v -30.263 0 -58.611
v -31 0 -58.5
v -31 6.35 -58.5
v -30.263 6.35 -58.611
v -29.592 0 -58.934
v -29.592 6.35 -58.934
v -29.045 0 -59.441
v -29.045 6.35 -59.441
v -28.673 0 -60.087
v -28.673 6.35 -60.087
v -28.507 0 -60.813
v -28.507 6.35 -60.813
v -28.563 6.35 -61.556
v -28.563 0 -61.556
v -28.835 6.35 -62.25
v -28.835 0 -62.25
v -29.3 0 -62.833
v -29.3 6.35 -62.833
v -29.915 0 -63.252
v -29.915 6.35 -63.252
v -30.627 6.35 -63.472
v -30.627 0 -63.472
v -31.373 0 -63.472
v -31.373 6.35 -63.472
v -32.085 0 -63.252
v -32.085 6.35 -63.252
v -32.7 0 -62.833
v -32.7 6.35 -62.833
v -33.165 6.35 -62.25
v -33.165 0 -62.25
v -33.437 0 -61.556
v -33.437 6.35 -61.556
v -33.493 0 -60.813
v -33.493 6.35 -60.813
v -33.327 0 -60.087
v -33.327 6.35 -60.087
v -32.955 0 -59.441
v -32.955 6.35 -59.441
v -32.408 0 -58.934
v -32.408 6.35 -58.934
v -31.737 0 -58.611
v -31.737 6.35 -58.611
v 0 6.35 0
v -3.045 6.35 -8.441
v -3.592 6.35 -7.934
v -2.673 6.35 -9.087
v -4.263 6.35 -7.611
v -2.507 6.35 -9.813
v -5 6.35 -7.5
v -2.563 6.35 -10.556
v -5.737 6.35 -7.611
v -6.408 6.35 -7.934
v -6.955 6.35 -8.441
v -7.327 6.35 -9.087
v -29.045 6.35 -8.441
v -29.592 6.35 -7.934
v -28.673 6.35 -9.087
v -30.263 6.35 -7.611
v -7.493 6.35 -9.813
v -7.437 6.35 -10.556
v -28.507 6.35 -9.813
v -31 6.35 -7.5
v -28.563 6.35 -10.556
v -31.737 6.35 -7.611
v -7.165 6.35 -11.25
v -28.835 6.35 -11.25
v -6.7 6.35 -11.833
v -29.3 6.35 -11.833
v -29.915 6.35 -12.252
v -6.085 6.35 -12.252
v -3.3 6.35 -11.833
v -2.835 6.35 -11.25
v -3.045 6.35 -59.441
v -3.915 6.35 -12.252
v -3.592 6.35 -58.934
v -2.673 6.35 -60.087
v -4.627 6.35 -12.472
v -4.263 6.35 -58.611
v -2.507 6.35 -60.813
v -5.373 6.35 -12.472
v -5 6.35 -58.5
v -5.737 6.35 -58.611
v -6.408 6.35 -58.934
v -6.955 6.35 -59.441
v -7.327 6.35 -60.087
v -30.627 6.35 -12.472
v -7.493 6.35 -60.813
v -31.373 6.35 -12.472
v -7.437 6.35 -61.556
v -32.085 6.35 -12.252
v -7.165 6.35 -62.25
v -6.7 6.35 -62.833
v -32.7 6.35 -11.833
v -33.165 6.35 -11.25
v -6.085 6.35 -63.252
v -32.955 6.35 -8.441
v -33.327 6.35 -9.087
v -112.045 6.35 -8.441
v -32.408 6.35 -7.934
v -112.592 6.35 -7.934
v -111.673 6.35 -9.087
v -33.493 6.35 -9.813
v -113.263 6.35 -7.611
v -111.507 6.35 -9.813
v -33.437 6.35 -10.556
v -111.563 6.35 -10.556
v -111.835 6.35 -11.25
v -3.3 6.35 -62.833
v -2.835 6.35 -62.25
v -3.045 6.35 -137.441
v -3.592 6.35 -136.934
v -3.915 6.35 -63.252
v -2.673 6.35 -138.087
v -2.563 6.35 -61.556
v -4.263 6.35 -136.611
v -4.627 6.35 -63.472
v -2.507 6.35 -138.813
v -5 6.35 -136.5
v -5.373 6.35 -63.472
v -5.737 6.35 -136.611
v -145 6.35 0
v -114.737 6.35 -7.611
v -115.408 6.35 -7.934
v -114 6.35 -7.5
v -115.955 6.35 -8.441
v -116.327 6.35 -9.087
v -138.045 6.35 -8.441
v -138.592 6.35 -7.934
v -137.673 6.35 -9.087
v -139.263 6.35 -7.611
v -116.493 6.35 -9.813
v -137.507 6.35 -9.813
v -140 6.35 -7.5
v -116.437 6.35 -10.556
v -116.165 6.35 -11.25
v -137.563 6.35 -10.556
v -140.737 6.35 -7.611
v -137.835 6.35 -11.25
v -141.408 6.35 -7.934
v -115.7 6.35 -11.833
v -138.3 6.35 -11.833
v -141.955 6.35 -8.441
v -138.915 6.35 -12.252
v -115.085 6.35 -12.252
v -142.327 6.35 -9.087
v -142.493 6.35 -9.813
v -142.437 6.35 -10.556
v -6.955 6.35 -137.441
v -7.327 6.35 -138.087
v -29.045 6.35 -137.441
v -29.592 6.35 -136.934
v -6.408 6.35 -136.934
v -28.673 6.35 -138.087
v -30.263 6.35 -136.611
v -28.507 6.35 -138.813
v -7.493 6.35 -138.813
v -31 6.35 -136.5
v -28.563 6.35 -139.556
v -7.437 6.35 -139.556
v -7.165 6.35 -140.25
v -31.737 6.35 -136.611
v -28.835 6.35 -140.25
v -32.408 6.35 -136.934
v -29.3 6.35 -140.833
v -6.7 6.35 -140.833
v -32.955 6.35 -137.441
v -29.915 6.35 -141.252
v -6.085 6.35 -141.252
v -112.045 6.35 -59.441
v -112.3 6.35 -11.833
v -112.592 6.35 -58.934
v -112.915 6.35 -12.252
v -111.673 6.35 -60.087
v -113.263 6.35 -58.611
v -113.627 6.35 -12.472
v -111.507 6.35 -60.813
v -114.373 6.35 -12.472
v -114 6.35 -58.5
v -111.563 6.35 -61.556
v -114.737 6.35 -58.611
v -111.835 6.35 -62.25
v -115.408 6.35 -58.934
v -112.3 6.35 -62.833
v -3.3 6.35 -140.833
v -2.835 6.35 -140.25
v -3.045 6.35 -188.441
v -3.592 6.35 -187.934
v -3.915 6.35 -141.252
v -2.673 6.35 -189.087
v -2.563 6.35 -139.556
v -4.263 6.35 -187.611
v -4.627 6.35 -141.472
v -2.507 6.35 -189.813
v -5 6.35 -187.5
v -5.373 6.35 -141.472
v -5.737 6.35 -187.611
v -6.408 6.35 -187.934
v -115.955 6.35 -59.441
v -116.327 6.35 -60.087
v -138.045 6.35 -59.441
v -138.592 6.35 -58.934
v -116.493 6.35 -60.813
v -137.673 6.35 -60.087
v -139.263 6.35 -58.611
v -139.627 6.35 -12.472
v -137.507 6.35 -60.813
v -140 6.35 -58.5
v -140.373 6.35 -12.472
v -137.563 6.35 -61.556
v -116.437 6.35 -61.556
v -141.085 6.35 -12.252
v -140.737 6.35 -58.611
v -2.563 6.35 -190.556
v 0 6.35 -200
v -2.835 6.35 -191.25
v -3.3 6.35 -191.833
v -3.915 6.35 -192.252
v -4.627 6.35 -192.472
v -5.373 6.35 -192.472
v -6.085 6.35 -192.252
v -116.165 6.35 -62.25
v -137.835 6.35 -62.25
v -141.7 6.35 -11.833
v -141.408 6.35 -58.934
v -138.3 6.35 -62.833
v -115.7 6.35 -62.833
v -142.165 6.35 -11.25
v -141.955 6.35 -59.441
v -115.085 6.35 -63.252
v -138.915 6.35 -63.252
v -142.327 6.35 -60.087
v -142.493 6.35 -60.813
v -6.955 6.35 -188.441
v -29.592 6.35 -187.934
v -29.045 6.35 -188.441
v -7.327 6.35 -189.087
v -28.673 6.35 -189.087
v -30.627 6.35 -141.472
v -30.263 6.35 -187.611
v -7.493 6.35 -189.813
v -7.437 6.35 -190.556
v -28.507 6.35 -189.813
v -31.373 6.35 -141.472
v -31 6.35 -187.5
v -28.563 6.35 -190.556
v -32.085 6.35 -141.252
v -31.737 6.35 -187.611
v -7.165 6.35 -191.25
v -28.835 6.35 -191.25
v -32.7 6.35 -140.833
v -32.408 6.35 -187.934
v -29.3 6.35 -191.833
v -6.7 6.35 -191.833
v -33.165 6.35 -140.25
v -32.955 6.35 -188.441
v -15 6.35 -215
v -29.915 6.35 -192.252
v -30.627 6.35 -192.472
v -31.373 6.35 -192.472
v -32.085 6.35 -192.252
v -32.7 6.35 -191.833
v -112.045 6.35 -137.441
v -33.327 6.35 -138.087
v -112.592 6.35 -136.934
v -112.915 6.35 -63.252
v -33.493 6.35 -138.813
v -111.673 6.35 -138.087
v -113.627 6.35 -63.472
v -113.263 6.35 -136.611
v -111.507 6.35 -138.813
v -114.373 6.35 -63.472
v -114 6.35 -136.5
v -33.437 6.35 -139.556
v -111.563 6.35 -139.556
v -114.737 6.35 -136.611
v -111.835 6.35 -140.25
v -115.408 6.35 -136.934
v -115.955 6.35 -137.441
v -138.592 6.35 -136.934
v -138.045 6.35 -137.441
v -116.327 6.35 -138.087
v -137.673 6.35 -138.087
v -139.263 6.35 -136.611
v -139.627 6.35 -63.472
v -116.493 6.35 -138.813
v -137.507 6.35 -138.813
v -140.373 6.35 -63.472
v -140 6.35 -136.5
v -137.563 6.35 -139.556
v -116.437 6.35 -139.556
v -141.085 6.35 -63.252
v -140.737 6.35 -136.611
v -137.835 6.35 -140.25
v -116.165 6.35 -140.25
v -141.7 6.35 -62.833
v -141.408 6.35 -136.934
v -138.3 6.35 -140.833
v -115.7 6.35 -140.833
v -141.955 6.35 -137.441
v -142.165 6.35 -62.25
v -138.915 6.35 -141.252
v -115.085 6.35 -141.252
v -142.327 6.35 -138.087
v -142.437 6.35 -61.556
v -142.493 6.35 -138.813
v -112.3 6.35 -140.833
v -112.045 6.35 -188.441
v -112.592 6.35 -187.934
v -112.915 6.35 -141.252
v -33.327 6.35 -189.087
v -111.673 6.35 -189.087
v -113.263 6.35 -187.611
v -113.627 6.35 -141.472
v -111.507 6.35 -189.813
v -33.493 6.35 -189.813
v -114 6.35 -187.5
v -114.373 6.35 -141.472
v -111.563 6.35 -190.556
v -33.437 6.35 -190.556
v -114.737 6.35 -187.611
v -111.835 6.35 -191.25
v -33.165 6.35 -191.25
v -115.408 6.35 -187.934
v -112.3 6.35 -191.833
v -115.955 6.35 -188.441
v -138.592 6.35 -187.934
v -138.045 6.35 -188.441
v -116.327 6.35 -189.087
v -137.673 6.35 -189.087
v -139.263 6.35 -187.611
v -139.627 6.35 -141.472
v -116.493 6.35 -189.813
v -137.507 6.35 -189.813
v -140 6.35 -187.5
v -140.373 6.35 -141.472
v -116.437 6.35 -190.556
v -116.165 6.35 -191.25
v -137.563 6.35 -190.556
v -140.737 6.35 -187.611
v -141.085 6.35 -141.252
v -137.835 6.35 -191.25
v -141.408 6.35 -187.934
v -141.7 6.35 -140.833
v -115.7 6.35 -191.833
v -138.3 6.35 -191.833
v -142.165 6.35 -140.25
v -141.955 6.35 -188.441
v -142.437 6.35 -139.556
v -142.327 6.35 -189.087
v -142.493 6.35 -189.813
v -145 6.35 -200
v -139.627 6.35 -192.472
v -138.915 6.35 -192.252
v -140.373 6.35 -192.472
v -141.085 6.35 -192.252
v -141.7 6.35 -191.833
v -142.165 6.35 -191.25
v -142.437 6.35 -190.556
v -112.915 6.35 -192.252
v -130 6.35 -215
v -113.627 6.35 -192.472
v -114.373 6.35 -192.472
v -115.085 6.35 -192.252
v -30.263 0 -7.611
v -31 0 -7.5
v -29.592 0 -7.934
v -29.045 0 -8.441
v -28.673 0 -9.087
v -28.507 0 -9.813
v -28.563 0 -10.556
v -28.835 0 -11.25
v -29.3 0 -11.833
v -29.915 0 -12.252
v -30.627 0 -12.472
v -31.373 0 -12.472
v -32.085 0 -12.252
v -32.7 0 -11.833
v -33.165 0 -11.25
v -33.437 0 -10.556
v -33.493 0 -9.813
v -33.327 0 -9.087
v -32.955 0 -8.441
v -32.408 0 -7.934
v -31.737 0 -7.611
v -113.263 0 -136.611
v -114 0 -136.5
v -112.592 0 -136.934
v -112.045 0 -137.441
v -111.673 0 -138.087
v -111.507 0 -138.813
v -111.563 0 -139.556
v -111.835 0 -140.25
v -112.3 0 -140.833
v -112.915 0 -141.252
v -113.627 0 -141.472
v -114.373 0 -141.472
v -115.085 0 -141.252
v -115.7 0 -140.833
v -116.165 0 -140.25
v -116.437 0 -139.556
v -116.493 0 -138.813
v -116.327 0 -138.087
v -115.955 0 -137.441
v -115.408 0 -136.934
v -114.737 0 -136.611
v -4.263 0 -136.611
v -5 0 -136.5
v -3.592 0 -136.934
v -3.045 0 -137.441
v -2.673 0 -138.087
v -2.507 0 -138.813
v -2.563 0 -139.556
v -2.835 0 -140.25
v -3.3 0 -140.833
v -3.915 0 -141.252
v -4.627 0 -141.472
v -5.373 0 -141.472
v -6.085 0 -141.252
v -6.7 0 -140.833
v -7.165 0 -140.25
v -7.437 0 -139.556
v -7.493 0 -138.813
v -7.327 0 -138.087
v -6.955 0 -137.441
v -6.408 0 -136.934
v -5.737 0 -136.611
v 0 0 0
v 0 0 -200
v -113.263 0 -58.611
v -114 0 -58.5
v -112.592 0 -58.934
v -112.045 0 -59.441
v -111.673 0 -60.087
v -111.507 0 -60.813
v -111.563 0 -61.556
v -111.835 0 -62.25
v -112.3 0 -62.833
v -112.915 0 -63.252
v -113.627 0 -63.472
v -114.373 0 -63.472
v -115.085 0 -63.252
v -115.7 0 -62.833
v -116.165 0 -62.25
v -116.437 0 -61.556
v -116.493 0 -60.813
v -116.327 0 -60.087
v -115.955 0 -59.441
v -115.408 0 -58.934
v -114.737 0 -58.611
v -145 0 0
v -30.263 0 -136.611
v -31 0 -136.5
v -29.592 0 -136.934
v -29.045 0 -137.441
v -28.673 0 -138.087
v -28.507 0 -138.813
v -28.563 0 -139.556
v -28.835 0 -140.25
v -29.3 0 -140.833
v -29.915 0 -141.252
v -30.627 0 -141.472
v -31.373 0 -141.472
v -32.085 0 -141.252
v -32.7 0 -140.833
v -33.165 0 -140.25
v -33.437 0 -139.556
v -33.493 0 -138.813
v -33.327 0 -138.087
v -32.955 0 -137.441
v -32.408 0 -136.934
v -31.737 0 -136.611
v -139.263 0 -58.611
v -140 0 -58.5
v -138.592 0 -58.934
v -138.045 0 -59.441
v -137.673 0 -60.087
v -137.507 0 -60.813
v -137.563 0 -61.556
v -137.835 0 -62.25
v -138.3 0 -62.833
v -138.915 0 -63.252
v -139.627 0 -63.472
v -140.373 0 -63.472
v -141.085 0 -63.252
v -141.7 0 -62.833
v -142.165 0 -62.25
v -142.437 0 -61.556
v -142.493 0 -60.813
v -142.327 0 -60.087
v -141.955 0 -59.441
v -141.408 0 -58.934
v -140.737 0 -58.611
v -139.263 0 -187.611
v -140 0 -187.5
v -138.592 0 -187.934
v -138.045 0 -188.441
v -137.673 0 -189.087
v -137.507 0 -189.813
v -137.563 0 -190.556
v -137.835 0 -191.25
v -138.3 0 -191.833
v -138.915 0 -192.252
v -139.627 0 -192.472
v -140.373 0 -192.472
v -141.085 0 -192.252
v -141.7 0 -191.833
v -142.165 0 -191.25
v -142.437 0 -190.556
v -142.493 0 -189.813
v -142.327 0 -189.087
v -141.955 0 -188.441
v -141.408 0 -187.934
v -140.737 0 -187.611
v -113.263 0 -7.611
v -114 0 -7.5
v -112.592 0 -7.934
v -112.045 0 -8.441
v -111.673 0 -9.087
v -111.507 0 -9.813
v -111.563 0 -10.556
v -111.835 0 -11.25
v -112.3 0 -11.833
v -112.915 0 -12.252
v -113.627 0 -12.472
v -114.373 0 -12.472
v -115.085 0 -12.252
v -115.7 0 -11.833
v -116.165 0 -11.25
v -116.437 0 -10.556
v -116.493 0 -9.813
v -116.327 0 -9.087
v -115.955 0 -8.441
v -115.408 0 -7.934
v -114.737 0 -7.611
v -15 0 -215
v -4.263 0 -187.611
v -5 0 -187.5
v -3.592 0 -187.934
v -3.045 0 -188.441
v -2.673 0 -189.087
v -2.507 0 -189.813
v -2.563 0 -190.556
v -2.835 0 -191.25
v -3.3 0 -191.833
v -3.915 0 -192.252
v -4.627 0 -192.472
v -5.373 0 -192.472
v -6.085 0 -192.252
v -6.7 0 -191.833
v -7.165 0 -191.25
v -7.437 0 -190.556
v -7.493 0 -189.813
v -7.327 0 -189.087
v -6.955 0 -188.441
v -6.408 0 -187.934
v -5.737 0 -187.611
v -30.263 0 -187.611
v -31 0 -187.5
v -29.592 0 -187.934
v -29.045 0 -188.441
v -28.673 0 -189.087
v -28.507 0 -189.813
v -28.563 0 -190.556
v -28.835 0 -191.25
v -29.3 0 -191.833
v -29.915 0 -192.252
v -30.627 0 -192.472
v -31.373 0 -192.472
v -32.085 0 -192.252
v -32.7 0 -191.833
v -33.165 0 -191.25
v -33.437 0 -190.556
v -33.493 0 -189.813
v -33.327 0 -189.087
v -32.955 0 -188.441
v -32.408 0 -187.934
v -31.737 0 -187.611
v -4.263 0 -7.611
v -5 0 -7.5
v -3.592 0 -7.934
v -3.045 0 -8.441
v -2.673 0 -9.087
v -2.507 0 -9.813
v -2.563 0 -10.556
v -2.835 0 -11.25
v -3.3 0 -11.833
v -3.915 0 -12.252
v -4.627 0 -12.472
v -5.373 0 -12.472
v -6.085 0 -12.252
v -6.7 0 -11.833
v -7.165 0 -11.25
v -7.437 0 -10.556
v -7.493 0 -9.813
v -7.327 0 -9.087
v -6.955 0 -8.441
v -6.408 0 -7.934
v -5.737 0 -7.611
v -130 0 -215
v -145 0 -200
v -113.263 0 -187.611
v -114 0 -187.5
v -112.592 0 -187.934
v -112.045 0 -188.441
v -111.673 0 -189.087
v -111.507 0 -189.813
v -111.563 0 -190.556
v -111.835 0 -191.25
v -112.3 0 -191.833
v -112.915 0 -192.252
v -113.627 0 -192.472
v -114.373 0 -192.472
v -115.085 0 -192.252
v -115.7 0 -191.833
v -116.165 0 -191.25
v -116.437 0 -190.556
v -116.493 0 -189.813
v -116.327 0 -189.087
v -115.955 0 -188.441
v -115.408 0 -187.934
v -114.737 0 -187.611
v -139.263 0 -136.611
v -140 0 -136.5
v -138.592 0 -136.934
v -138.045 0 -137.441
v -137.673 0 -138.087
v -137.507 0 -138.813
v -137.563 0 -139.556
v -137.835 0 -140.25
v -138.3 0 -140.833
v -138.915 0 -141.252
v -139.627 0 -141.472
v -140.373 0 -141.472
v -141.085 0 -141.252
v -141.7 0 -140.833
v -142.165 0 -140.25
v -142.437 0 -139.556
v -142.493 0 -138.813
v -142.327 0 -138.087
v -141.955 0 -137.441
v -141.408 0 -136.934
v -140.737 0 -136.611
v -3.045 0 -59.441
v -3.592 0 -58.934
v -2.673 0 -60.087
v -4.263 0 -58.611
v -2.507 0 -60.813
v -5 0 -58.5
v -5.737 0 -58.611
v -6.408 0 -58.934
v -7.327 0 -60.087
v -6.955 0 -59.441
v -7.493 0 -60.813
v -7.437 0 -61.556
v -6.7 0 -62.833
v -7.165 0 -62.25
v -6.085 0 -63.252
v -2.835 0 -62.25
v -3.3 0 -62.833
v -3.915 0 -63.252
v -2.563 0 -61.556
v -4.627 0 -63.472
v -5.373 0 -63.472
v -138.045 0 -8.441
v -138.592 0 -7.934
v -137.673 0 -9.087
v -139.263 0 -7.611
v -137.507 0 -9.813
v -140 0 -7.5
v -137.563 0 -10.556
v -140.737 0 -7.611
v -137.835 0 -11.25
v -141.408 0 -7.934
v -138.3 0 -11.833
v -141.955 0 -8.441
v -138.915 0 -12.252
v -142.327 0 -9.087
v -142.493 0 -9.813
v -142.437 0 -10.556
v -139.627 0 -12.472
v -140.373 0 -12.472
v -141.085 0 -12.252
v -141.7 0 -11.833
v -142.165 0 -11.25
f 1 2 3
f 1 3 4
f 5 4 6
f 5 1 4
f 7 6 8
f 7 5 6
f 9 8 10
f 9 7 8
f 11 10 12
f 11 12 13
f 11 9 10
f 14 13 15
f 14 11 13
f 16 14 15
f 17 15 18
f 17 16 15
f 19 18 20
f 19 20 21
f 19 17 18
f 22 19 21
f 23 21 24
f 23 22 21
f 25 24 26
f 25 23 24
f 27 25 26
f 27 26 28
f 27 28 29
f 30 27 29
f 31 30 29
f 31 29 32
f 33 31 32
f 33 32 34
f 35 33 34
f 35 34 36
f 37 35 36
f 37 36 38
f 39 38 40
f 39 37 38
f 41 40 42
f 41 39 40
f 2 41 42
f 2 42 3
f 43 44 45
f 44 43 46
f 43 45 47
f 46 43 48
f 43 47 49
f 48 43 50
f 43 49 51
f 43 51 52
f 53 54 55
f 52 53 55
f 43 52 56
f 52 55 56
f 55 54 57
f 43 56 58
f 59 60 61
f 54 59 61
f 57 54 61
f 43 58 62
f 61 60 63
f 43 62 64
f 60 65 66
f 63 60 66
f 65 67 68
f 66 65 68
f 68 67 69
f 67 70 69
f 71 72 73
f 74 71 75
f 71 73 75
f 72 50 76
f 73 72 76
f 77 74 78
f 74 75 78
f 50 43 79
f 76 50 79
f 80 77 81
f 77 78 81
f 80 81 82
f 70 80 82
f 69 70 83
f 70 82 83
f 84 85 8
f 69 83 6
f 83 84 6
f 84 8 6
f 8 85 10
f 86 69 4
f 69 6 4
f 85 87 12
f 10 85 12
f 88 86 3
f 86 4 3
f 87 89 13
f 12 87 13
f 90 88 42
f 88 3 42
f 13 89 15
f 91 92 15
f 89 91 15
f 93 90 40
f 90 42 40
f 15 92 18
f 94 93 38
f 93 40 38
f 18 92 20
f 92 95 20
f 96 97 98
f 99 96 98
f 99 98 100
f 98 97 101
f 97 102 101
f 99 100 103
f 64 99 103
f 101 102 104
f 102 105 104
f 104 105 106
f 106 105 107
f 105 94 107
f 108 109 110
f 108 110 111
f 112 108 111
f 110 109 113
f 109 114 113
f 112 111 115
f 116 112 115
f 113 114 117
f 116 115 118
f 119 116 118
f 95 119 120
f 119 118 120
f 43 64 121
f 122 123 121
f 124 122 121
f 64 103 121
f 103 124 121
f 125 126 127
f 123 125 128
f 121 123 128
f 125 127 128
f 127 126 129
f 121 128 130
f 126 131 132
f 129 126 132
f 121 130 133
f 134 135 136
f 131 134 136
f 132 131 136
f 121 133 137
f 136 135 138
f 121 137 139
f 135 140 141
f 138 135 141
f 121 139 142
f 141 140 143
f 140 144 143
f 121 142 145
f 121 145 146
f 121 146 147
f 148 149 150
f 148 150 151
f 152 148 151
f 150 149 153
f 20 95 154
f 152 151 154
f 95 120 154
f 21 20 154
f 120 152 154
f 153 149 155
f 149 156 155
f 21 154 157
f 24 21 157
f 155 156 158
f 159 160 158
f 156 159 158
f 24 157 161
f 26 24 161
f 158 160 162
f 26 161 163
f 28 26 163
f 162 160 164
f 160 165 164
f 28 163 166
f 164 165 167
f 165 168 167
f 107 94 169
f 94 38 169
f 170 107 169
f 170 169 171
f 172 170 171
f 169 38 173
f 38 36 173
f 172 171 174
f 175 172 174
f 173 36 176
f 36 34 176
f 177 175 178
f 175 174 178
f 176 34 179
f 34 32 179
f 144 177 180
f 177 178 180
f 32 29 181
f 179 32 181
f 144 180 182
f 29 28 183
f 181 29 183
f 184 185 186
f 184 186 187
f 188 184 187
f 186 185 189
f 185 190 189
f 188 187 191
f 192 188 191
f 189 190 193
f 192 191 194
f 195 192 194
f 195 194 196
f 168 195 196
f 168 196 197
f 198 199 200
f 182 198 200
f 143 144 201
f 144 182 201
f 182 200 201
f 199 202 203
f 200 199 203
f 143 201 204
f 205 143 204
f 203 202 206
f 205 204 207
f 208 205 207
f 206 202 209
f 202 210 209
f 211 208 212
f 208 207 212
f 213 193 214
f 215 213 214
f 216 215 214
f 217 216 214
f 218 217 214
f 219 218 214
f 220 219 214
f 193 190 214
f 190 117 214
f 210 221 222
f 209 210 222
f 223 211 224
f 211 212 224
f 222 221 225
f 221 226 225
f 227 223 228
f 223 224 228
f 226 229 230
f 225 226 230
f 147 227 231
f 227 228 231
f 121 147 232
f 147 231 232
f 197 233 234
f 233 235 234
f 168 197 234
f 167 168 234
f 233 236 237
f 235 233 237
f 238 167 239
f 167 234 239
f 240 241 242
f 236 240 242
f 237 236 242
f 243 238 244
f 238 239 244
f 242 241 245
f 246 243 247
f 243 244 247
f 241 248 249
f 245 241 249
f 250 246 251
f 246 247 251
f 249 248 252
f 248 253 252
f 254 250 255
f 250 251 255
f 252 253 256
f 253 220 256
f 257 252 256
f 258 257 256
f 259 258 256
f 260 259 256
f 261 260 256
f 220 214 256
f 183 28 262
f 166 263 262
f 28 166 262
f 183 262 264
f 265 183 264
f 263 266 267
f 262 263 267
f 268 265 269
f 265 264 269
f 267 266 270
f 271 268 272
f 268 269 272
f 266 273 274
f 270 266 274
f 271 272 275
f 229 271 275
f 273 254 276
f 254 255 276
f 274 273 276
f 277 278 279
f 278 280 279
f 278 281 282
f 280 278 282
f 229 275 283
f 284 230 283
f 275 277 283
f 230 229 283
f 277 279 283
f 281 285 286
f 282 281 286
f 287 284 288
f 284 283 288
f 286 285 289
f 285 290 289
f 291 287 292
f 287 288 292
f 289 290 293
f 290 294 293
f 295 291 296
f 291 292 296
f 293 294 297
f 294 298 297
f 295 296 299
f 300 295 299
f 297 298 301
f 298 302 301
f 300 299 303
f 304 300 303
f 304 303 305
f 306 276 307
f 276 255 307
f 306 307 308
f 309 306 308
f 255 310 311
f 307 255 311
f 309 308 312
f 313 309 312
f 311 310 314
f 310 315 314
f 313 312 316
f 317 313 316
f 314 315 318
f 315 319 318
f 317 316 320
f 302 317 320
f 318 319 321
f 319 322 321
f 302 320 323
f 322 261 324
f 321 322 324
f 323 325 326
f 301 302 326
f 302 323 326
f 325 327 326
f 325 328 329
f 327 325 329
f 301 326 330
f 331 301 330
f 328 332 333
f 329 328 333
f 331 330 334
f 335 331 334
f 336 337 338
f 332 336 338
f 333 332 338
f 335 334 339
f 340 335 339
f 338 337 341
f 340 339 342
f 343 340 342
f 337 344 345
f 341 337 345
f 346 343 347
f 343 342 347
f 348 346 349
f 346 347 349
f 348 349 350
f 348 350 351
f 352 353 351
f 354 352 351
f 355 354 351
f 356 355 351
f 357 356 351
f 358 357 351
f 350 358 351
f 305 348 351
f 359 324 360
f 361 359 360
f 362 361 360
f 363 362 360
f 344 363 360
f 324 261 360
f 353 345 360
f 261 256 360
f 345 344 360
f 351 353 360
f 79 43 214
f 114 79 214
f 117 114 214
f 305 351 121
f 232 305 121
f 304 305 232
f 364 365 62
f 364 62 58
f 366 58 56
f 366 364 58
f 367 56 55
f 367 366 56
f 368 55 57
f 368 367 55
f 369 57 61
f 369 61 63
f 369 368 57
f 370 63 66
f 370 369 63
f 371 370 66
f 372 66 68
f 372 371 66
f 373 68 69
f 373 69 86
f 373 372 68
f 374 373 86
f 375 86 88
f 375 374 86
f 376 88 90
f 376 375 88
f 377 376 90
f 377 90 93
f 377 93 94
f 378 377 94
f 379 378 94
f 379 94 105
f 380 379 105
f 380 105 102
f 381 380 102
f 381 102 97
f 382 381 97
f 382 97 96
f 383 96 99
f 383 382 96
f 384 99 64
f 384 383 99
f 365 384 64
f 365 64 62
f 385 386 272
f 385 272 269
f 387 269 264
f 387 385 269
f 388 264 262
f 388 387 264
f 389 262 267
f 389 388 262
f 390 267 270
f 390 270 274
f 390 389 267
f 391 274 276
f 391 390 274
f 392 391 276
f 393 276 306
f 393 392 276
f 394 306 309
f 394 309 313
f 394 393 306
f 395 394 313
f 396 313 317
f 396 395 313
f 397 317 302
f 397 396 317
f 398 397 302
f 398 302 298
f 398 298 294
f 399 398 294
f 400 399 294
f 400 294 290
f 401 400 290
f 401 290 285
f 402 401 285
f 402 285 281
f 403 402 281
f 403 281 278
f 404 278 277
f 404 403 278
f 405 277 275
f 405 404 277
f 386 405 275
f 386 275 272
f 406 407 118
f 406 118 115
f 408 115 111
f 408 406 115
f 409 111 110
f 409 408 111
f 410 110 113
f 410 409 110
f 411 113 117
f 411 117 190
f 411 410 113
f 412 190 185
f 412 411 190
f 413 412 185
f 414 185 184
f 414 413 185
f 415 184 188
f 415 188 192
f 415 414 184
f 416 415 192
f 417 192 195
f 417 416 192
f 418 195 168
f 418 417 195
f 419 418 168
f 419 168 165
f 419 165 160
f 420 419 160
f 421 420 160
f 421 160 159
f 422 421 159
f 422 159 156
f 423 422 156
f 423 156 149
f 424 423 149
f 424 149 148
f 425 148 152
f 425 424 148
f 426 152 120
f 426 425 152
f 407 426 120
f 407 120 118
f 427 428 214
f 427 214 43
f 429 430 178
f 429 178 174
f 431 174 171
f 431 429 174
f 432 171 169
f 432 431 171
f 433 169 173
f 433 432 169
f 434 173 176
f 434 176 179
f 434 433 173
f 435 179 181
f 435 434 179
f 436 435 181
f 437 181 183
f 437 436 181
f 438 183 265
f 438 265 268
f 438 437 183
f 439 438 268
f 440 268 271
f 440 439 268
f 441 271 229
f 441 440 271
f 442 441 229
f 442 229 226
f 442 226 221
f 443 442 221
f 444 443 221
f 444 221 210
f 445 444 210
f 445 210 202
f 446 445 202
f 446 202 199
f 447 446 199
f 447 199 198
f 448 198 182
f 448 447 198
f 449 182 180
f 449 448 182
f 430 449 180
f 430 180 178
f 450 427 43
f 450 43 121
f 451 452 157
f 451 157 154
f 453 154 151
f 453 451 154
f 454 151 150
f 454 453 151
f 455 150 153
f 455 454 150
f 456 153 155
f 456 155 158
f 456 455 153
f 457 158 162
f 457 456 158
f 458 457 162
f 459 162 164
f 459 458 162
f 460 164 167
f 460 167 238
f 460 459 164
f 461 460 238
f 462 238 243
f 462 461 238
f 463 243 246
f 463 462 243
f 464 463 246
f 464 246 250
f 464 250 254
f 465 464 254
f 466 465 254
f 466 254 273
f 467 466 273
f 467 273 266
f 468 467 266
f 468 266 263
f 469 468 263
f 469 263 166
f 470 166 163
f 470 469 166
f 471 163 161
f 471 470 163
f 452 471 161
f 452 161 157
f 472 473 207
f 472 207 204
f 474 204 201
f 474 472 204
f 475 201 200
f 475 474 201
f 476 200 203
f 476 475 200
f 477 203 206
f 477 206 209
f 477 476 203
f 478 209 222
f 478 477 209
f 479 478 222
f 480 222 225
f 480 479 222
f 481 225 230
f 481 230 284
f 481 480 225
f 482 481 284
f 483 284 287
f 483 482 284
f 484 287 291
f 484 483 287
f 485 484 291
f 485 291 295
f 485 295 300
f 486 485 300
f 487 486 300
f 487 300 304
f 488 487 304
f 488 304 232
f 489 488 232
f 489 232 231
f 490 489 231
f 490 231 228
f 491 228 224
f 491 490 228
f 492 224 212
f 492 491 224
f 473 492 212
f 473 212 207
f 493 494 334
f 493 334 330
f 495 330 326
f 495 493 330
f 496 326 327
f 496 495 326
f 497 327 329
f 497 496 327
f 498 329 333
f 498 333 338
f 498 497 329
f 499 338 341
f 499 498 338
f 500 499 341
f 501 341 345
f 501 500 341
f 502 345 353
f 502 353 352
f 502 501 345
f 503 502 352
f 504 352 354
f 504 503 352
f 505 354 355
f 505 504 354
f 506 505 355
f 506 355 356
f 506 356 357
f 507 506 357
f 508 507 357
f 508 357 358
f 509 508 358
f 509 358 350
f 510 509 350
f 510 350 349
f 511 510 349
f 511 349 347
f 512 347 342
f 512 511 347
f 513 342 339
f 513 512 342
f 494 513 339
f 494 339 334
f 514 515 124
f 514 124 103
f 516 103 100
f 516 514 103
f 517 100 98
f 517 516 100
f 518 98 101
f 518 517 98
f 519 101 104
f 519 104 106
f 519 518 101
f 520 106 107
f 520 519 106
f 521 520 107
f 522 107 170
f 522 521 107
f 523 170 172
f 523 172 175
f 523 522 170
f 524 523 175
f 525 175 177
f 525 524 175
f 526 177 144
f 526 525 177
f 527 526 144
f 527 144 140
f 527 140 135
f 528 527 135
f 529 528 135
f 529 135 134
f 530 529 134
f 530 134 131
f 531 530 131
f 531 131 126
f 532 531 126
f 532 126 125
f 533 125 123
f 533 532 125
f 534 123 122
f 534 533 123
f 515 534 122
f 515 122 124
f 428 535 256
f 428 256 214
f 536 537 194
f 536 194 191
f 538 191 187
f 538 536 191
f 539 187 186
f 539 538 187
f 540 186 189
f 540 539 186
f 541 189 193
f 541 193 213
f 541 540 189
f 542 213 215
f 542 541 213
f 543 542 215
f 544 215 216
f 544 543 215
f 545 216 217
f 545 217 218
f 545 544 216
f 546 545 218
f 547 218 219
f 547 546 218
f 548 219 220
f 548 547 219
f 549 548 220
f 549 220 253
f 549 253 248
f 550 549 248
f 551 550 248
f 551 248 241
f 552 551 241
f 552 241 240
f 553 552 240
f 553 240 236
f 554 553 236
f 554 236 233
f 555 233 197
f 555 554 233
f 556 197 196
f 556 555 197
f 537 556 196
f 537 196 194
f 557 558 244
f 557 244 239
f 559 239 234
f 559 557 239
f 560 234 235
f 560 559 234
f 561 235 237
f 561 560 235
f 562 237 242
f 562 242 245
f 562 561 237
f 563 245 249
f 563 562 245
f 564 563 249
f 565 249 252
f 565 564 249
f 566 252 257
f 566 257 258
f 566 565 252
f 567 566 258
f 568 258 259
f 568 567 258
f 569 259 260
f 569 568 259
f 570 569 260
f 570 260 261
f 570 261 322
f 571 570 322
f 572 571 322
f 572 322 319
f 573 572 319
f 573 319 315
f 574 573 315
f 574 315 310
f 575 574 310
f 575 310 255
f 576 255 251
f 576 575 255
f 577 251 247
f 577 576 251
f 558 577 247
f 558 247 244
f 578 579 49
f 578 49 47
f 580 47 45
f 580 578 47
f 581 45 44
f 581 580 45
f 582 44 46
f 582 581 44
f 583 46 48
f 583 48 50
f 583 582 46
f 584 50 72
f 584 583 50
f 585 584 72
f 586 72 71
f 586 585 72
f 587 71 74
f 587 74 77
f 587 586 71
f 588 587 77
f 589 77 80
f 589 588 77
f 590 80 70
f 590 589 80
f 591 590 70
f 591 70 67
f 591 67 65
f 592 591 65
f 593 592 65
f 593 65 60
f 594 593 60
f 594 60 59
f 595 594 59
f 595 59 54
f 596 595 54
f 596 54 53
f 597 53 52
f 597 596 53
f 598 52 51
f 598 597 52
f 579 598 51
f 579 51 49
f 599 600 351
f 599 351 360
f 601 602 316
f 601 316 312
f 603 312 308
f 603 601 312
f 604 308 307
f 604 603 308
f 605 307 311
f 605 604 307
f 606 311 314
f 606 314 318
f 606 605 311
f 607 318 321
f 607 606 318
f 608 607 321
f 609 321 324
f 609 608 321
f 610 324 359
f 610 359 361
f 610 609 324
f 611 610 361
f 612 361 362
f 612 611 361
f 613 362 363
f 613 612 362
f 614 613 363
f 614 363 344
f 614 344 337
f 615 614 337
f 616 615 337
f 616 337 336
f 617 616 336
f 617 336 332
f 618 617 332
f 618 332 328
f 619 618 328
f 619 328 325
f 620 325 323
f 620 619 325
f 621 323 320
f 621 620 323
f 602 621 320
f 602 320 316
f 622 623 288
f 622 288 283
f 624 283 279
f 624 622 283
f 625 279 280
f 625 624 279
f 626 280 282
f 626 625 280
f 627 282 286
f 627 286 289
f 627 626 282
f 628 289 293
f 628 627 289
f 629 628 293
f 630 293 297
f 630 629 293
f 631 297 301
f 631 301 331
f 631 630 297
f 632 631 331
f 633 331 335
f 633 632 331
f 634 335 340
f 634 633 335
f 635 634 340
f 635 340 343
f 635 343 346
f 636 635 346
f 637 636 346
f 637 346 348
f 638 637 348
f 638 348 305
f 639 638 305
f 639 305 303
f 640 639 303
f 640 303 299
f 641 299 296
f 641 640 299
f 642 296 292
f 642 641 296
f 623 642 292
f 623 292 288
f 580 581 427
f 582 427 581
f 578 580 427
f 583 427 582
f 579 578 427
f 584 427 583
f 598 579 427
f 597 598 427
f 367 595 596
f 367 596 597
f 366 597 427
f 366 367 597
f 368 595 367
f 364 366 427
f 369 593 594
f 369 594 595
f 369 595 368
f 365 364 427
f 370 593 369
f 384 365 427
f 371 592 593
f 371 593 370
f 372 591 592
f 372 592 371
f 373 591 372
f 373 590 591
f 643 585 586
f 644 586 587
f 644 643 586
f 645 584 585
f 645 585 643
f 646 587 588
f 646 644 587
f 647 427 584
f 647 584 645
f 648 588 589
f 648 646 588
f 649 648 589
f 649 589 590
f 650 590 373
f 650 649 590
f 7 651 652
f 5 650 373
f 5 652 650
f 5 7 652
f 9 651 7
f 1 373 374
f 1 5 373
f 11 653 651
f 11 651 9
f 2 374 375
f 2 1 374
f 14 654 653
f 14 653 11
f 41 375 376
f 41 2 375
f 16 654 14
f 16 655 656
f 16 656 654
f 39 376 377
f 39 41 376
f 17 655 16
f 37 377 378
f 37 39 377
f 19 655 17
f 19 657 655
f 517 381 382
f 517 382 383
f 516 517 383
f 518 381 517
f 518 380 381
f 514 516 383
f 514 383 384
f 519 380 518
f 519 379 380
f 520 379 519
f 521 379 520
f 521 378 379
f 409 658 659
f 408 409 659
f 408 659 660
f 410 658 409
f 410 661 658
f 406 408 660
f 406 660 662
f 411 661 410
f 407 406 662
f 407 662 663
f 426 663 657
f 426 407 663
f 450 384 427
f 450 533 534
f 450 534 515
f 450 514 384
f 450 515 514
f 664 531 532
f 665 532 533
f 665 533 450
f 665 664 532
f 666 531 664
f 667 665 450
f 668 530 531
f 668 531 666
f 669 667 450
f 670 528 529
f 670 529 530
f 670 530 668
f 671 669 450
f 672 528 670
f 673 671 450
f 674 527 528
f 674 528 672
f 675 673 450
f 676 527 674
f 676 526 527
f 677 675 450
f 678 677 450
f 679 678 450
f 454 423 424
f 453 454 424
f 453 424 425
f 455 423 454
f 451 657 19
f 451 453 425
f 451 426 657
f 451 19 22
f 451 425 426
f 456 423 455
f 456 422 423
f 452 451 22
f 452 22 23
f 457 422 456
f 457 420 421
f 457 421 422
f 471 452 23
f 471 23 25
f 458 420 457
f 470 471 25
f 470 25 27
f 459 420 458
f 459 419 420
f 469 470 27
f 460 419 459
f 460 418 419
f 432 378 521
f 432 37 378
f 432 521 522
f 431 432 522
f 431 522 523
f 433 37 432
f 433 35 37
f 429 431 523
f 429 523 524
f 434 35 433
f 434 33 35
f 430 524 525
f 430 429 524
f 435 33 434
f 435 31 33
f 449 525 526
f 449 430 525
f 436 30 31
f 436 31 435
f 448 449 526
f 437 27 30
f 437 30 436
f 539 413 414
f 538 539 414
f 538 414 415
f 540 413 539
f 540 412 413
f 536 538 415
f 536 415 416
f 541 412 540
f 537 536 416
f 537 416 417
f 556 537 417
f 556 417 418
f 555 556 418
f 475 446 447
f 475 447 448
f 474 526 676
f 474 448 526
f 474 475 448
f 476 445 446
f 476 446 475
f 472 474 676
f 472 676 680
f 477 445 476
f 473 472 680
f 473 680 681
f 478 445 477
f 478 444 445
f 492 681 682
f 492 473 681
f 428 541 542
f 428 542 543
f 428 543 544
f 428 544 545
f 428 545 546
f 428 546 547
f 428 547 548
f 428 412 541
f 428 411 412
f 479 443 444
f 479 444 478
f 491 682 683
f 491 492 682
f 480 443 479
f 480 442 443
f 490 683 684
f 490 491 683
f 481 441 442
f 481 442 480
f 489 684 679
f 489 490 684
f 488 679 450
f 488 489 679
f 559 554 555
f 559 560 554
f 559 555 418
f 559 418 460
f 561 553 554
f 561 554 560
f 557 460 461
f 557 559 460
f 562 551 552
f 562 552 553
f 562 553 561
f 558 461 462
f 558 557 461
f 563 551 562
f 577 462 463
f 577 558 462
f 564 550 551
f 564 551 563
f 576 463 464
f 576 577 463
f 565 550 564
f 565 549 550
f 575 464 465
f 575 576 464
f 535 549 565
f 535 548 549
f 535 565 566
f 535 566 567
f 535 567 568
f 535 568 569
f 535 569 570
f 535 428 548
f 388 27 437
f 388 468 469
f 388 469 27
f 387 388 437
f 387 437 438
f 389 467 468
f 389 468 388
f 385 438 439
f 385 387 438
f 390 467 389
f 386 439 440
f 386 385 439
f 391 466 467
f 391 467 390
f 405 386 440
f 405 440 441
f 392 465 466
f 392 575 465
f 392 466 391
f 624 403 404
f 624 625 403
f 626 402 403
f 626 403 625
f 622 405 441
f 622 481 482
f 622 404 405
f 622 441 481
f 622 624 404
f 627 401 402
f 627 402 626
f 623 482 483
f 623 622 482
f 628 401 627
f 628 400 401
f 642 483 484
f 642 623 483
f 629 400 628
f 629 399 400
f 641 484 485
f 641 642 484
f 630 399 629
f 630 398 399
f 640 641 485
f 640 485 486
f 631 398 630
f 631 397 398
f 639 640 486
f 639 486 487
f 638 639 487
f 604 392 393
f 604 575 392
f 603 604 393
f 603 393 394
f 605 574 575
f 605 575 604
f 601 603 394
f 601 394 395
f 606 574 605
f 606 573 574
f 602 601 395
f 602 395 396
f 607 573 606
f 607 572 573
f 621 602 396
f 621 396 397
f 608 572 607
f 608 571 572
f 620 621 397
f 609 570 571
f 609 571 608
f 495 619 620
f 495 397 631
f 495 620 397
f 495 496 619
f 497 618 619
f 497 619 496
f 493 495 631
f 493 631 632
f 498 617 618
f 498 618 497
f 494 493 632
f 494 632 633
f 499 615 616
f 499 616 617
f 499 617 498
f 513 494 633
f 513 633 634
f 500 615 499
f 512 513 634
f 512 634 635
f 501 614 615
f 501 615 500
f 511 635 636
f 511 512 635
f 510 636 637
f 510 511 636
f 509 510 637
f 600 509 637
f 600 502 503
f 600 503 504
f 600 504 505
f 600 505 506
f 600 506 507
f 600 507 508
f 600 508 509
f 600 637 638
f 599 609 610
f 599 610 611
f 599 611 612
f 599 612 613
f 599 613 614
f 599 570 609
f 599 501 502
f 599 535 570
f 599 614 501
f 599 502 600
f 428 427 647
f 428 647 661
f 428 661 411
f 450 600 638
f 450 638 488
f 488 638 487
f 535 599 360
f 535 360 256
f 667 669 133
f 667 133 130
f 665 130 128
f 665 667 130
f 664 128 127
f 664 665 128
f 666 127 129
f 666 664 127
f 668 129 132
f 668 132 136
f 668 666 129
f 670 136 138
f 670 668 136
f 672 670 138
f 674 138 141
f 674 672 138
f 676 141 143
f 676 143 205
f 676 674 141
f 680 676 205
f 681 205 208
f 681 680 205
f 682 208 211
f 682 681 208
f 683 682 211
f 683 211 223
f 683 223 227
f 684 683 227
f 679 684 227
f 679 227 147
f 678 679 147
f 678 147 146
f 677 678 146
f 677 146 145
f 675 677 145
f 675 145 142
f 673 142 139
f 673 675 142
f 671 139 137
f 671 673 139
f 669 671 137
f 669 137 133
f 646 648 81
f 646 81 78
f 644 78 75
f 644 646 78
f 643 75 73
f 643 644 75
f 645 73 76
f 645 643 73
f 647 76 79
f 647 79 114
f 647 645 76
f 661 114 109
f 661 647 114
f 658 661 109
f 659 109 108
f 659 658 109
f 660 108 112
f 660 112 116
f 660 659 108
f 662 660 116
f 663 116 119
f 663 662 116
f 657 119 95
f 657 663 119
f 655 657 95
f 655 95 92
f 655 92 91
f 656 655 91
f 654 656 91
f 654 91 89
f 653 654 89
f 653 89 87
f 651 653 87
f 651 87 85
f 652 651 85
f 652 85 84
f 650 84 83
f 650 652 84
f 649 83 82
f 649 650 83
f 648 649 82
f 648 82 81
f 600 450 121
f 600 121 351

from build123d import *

# Parameters (mm, degrees)
SKETCH1_R           = 2.5
BOSS_EXTRUDE1_DEPTH = 6.35


with BuildPart() as part:
    # Sketch1 → Boss-Extrude1 (new body)
    with BuildSketch(Plane(origin=(0, 0, 0), x_dir=(1, 0, 0), z_dir=(0, 1, 0))):
        Polygon((-145, 200), (-130, 215), (-15, 215), (0, 200), (0, 0), (-145, 0), align=None)
        with Locations(Location((-140, 190, 0), (0, 0, 270))):
            Circle(SKETCH1_R, mode=Mode.SUBTRACT)
        with Locations(Location((-114, 190, 0), (0, 0, 270))):
            Circle(SKETCH1_R, mode=Mode.SUBTRACT)
        with Locations(Location((-140, 139, 0), (0, 0, 270))):
            Circle(SKETCH1_R, mode=Mode.SUBTRACT)
        with Locations(Location((-114, 139, 0), (0, 0, 270))):
            Circle(SKETCH1_R, mode=Mode.SUBTRACT)
        with Locations(Location((-31, 190, 0), (0, 0, 270))):
            Circle(SKETCH1_R, mode=Mode.SUBTRACT)
        with Locations(Location((-5, 190, 0), (0, 0, 270))):
            Circle(SKETCH1_R, mode=Mode.SUBTRACT)
        with Locations(Location((-5, 139, 0), (0, 0, 270))):
            Circle(SKETCH1_R, mode=Mode.SUBTRACT)
        with Locations(Location((-31, 139, 0), (0, 0, 270))):
            Circle(SKETCH1_R, mode=Mode.SUBTRACT)
        with Locations(Location((-5, 10, 0), (0, 0, 270))):
            Circle(SKETCH1_R, mode=Mode.SUBTRACT)
        with Locations(Location((-5, 61, 0), (0, 0, 270))):
            Circle(SKETCH1_R, mode=Mode.SUBTRACT)
        with Locations(Location((-31, 61, 0), (0, 0, 270))):
            Circle(SKETCH1_R, mode=Mode.SUBTRACT)
        with Locations(Location((-31, 10, 0), (0, 0, 270))):
            Circle(SKETCH1_R, mode=Mode.SUBTRACT)
        with Locations(Location((-114, 10, 0), (0, 0, 270))):
            Circle(SKETCH1_R, mode=Mode.SUBTRACT)
        with Locations(Location((-114, 61, 0), (0, 0, 270))):
            Circle(SKETCH1_R, mode=Mode.SUBTRACT)
        with Locations(Location((-140, 10, 0), (0, 0, 270))):
            Circle(SKETCH1_R, mode=Mode.SUBTRACT)
        with Locations(Location((-140, 61, 0), (0, 0, 270))):
            Circle(SKETCH1_R, mode=Mode.SUBTRACT)
    extrude(amount=BOSS_EXTRUDE1_DEPTH)


solid = part.part
